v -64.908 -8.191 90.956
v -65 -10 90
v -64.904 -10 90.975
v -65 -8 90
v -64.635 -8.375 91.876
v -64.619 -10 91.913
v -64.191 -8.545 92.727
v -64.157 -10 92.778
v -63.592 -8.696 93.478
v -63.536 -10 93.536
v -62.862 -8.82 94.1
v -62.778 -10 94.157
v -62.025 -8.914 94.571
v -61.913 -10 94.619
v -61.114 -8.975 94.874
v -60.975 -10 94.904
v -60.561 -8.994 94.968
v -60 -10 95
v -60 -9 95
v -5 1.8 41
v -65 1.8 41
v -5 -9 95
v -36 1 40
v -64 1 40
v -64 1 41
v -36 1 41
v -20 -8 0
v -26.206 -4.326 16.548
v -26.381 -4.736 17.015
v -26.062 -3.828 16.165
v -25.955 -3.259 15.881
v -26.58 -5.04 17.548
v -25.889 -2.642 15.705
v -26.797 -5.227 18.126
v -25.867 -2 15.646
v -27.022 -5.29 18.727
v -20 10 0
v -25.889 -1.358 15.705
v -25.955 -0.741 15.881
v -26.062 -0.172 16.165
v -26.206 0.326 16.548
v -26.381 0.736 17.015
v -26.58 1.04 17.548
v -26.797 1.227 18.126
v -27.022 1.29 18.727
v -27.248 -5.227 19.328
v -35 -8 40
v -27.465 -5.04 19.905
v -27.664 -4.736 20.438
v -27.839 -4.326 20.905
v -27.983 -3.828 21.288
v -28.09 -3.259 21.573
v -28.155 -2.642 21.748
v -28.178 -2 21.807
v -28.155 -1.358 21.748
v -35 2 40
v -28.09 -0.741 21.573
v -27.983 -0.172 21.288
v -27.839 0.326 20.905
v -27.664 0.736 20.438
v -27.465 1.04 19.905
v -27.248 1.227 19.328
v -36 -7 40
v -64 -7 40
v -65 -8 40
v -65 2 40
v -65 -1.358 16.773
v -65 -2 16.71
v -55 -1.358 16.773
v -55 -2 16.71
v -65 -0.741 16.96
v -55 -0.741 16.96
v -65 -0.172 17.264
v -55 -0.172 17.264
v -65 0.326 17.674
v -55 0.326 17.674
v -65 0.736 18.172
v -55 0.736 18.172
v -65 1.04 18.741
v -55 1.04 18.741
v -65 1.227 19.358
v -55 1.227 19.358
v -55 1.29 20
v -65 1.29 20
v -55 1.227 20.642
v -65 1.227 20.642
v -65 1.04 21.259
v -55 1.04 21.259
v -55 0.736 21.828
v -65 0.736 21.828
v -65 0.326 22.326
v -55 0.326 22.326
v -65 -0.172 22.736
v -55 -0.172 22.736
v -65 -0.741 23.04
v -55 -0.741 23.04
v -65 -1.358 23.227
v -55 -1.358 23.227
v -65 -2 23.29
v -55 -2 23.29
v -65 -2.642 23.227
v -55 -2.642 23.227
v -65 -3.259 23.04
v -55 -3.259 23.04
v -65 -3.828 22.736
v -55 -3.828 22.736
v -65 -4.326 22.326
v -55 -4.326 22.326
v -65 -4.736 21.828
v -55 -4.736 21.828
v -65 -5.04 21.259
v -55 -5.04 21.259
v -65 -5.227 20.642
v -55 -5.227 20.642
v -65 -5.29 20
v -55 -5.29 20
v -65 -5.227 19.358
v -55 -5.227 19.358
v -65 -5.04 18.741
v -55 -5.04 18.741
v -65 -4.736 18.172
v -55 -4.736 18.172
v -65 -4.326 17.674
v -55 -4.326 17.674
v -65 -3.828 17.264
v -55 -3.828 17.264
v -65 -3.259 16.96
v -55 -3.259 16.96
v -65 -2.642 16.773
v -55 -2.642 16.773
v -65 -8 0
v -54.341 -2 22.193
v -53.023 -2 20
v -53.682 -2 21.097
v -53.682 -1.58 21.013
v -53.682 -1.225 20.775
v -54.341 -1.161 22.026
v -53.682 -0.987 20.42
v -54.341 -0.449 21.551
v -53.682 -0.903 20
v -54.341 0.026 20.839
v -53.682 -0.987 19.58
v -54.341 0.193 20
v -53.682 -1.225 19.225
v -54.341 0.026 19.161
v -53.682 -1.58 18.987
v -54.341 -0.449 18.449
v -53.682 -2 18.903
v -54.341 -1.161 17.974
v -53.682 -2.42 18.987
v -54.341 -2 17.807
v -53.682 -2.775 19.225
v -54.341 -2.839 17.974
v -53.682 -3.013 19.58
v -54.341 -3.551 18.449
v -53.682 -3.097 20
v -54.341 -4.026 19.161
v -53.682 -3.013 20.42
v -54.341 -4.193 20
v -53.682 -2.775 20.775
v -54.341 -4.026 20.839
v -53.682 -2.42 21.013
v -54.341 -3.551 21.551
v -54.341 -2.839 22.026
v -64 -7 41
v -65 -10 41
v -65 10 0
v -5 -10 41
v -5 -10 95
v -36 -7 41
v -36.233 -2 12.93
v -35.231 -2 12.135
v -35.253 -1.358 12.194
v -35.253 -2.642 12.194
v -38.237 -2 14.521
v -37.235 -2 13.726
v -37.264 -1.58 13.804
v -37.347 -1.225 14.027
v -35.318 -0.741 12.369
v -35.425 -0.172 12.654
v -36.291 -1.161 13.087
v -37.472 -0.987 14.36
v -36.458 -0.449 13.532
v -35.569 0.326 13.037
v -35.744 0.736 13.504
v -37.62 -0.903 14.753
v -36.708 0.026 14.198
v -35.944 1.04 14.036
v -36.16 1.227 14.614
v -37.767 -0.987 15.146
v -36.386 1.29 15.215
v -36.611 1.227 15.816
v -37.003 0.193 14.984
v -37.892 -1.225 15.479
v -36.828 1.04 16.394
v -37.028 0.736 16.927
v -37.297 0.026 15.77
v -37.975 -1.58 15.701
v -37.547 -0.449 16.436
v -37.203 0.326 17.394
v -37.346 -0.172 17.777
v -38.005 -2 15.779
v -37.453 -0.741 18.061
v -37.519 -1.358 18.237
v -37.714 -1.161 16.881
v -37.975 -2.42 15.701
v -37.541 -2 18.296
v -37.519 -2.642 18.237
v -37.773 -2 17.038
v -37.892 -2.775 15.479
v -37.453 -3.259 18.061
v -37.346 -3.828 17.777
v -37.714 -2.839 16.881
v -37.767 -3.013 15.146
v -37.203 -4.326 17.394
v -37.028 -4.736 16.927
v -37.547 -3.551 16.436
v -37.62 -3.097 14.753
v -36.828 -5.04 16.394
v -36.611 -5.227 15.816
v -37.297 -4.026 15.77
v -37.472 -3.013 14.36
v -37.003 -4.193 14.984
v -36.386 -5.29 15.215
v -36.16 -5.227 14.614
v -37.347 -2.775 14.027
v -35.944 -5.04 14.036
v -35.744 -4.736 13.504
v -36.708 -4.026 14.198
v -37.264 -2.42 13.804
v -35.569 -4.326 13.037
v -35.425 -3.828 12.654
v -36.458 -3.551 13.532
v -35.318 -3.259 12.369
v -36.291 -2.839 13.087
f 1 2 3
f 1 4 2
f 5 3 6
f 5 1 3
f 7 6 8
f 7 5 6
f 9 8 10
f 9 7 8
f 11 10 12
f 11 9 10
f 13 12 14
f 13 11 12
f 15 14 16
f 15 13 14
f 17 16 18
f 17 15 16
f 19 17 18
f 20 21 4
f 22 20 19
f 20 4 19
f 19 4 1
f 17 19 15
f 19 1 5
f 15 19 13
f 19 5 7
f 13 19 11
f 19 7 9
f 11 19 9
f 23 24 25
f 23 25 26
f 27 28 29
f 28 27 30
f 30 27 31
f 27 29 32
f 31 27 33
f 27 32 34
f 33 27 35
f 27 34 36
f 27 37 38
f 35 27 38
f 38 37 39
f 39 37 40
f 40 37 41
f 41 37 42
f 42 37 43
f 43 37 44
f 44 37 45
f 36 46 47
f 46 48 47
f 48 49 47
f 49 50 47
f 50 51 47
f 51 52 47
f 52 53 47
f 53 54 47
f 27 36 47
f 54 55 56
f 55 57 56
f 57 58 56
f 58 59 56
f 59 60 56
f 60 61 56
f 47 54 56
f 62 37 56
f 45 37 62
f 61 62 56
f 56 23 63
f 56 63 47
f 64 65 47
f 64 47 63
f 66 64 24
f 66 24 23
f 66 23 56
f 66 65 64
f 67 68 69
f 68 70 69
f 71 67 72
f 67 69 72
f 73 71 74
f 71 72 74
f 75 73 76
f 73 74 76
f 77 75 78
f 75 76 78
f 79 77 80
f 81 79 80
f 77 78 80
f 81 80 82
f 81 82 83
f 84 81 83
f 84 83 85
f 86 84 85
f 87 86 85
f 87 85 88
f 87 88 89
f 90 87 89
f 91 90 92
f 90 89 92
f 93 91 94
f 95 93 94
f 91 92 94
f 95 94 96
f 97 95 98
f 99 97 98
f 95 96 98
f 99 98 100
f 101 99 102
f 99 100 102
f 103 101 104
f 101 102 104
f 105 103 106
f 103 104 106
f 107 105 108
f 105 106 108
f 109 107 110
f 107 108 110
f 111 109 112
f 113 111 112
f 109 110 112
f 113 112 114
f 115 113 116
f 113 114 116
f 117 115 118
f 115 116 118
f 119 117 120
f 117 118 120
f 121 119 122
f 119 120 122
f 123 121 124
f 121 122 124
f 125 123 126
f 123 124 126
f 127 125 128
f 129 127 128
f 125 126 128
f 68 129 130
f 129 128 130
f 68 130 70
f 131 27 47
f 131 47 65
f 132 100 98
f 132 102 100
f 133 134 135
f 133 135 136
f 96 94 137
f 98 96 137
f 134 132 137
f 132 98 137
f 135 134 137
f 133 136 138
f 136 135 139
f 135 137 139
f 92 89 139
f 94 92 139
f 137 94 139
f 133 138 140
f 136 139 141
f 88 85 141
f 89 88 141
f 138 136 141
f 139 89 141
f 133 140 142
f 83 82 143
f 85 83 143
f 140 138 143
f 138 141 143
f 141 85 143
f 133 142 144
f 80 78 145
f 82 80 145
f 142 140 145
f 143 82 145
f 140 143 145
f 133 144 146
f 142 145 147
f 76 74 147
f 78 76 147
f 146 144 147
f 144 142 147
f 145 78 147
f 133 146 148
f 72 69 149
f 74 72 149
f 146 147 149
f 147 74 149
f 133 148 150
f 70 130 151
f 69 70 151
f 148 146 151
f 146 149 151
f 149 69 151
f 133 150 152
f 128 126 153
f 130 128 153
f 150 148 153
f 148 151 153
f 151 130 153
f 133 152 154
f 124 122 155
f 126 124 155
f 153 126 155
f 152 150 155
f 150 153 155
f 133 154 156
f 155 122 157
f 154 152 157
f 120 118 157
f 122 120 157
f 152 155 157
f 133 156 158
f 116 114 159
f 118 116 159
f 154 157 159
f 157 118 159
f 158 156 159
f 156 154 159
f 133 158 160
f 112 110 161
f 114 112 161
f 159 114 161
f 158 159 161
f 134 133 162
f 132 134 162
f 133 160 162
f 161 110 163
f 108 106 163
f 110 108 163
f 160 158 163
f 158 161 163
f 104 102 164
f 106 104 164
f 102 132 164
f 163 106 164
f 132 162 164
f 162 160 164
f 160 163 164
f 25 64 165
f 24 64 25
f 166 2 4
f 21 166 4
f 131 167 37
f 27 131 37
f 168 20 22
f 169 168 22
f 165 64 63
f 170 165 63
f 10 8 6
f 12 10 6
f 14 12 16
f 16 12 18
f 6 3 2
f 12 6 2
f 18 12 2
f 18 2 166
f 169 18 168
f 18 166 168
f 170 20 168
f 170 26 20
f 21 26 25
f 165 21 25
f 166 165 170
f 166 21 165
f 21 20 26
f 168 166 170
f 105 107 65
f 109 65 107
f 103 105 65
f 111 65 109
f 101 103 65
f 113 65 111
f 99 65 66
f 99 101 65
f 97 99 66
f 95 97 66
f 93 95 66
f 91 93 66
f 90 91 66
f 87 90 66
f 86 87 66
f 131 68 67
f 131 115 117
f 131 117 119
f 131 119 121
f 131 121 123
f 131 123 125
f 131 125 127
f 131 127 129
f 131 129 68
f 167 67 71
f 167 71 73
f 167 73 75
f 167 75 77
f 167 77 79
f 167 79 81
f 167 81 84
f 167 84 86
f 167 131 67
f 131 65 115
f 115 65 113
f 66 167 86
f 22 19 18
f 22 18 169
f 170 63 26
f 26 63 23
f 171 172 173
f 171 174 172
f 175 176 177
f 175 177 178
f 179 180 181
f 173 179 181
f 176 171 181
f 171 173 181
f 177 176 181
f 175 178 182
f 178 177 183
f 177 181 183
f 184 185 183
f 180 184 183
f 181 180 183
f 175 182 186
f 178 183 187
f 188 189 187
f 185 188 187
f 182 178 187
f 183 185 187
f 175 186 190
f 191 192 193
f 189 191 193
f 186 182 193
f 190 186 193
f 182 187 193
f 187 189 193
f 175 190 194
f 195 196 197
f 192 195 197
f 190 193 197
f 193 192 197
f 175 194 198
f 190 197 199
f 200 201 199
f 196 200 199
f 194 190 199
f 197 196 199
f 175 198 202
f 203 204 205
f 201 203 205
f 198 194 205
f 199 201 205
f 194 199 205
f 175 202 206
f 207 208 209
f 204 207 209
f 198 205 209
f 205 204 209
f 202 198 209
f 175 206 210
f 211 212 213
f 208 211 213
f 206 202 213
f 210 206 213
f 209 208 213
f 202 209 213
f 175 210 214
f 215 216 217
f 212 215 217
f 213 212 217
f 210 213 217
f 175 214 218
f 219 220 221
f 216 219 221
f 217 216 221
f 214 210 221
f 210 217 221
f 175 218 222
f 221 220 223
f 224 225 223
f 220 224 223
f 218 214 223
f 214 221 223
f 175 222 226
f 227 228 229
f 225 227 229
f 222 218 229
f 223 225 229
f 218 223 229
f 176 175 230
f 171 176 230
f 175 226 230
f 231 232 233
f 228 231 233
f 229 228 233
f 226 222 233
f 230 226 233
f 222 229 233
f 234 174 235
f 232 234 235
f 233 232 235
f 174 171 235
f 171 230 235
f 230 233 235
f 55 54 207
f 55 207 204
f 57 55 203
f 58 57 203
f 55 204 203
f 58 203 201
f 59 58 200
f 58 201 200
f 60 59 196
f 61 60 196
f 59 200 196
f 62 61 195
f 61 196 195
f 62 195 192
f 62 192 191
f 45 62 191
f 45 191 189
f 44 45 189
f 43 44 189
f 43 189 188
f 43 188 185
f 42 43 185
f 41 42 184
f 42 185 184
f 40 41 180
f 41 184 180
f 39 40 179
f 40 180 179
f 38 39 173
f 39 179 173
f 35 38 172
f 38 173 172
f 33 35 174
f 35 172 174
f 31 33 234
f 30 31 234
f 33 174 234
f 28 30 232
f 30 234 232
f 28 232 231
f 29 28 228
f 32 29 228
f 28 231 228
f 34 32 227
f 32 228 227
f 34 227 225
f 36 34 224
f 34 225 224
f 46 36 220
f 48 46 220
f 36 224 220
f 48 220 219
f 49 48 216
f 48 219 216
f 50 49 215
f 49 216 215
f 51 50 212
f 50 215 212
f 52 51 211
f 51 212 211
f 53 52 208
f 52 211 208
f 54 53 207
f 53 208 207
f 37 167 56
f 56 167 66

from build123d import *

# Parameters (mm, degrees)
ESBO_O1_W                                      = 130
ESBO_O1_H                                      = 20
RESSALTO_EXTRUS_O1_DEPTH                       = 95
CORTE_EXTRUS_O2_REACH                          = 22
CORTE_EXTRUS_O4_DEPTH                          = 1
CORTE_EXTRUS_O4_DEPTH_BACK                     = 61
BROCA_DE_ROSQUEAR_DE_CANO_PARA_TARRAXA_D_D     = 6.579997
BROCA_DE_ROSQUEAR_DE_CANO_PARA_TARRAXA_D_DEPTH = 10
BROCA_DE_ROSQUEAR_DE_CANO_PARA_TARRAXA_D_TIP   = 1.976830535
BROCA_DE_ROSQUEAR_DE_CANO_PARA_TARRA_2_D       = 6.579997
BROCA_DE_ROSQUEAR_DE_CANO_PARA_TARRA_2_DEPTH   = 10
BROCA_DE_ROSQUEAR_DE_CANO_PARA_TARRA_2_TIP     = 1.976830535
FILETE2_R                                      = 5
CORTE_EXTRUS_O10_REACH                         = 62
RESSALTO_EXTRUS_O2_REACH                       = 57
ESBO_O41_W                                     = 28
ESBO_O41_H                                     = 8
ESBO_O42_W                                     = 45
ESBO_O42_H                                     = 2
CORTE_EXTRUS_O11_DEPTH                         = 41


with BuildPart() as part:
    # Esboço1 → Ressalto-extrusão1 (new body)
    with BuildSketch(Plane.XY):
        Rectangle(ESBO_O1_W, ESBO_O1_H)
    extrude(amount=RESSALTO_EXTRUS_O1_DEPTH)

    # Esboço2 → Corte-extrusão2 (cut, up to next)
    with BuildSketch(Plane(origin=(0, 10, 0), x_dir=(1, 0, 0), z_dir=(0, 1, 0)), mode=Mode.PRIVATE) as corte_extrus_o2_sk1:
        Polygon((65, 0), (-20, 0), (-35, -40), (-35, -41), (-5, -41), (-5, -95), (65, -95), align=None)
    corte_extrus_o2_tool1 = extrude(corte_extrus_o2_sk1.sketch, amount=-CORTE_EXTRUS_O2_REACH, mode=Mode.PRIVATE) & part.part
    add(corte_extrus_o2_tool1.solids().sort_by_distance((24.261214, 10, 44.470976))[0], mode=Mode.SUBTRACT)

    # Esboço13 → Corte-extrusão4 (cut, two sides)
    with BuildSketch(Plane.ZY.offset(65)) as corte_extrus_o4_sk:
        Polygon((-200.200134404, 50.040026881), (0, 10), (95, -9), (295.200134404, -49.040026881), (375.280188165, 351.360241926), (-120.120080642, 450.440295688), align=None)
    extrude(amount=CORTE_EXTRUS_O4_DEPTH, mode=Mode.SUBTRACT)
    extrude(corte_extrus_o4_sk.sketch, amount=-CORTE_EXTRUS_O4_DEPTH_BACK, mode=Mode.SUBTRACT)

    # Broca de rosquear de cano para tarraxa d
    with Locations(Plane.ZY.offset(65)):
        with Locations((20, -2)):
            Hole(BROCA_DE_ROSQUEAR_DE_CANO_PARA_TARRAXA_D_D / 2, depth=BROCA_DE_ROSQUEAR_DE_CANO_PARA_TARRAXA_D_DEPTH)
            with Locations((0, 0, -(BROCA_DE_ROSQUEAR_DE_CANO_PARA_TARRAXA_D_DEPTH + BROCA_DE_ROSQUEAR_DE_CANO_PARA_TARRAXA_D_TIP / 2))):  # 118° drill point
                Cone(0, BROCA_DE_ROSQUEAR_DE_CANO_PARA_TARRAXA_D_D / 2, BROCA_DE_ROSQUEAR_DE_CANO_PARA_TARRAXA_D_TIP, mode=Mode.SUBTRACT)

    # Broca de rosquear de cano para tarra 2
    with Locations(Plane(origin=(-17.534246575, 0, -6.575342466), x_dir=(0.351123442, 0, -0.936329178), z_dir=(0.936329178, 0, 0.351123442))):
        with Locations((-27.022468832, -2)):
            Hole(BROCA_DE_ROSQUEAR_DE_CANO_PARA_TARRA_2_D / 2, depth=BROCA_DE_ROSQUEAR_DE_CANO_PARA_TARRA_2_DEPTH)
            with Locations((0, 0, -(BROCA_DE_ROSQUEAR_DE_CANO_PARA_TARRA_2_DEPTH + BROCA_DE_ROSQUEAR_DE_CANO_PARA_TARRA_2_TIP / 2))):  # 118° drill point
                Cone(0, BROCA_DE_ROSQUEAR_DE_CANO_PARA_TARRA_2_D / 2, BROCA_DE_ROSQUEAR_DE_CANO_PARA_TARRA_2_TIP, mode=Mode.SUBTRACT)

    # Filete2
    filete2_edges = [part.edges().sort_by_distance(p)[0] for p in [
        (-65, -9.5, 95),
    ]]
    fillet(filete2_edges, radius=FILETE2_R)

    # Esboço40 → Corte-extrusão10 (cut, up to next)
    with BuildSketch(Plane.ZY.offset(65), mode=Mode.PRIVATE) as corte_extrus_o10_sk1:
        Polygon((41, 1.8), (41, -10), (40, -10), (40, 2), align=None)
    corte_extrus_o10_tool1 = extrude(corte_extrus_o10_sk1.sketch, amount=-CORTE_EXTRUS_O10_REACH, mode=Mode.PRIVATE) & part.part
    add(corte_extrus_o10_tool1.solids().sort_by_distance((-65, -4.04986, 40.498599))[0], mode=Mode.SUBTRACT)

    # Esboço41 → Ressalto-extrusão2 (add, up to next)
    with BuildSketch(Plane.XY.offset(40), mode=Mode.PRIVATE) as ressalto_extrus_o2_sk1:
        with Locations((-50, -3)):
            Rectangle(ESBO_O41_W, ESBO_O41_H)
    ressalto_extrus_o2_tool1 = extrude(ressalto_extrus_o2_sk1.sketch, amount=RESSALTO_EXTRUS_O2_REACH, mode=Mode.PRIVATE) - part.part
    add(ressalto_extrus_o2_tool1.solids().sort_by_distance((-50, -3, 40))[0])

    # Esboço42 → Corte-extrusão11 (cut)
    with BuildSketch(Plane(origin=(0, 0, 0), x_dir=(-1, 0, 0), z_dir=(0, 0, -1))):
        with Locations((42.5, -9)):
            Rectangle(ESBO_O42_W, ESBO_O42_H)
    extrude(amount=-CORTE_EXTRUS_O11_DEPTH, mode=Mode.SUBTRACT)


solid = part.part
